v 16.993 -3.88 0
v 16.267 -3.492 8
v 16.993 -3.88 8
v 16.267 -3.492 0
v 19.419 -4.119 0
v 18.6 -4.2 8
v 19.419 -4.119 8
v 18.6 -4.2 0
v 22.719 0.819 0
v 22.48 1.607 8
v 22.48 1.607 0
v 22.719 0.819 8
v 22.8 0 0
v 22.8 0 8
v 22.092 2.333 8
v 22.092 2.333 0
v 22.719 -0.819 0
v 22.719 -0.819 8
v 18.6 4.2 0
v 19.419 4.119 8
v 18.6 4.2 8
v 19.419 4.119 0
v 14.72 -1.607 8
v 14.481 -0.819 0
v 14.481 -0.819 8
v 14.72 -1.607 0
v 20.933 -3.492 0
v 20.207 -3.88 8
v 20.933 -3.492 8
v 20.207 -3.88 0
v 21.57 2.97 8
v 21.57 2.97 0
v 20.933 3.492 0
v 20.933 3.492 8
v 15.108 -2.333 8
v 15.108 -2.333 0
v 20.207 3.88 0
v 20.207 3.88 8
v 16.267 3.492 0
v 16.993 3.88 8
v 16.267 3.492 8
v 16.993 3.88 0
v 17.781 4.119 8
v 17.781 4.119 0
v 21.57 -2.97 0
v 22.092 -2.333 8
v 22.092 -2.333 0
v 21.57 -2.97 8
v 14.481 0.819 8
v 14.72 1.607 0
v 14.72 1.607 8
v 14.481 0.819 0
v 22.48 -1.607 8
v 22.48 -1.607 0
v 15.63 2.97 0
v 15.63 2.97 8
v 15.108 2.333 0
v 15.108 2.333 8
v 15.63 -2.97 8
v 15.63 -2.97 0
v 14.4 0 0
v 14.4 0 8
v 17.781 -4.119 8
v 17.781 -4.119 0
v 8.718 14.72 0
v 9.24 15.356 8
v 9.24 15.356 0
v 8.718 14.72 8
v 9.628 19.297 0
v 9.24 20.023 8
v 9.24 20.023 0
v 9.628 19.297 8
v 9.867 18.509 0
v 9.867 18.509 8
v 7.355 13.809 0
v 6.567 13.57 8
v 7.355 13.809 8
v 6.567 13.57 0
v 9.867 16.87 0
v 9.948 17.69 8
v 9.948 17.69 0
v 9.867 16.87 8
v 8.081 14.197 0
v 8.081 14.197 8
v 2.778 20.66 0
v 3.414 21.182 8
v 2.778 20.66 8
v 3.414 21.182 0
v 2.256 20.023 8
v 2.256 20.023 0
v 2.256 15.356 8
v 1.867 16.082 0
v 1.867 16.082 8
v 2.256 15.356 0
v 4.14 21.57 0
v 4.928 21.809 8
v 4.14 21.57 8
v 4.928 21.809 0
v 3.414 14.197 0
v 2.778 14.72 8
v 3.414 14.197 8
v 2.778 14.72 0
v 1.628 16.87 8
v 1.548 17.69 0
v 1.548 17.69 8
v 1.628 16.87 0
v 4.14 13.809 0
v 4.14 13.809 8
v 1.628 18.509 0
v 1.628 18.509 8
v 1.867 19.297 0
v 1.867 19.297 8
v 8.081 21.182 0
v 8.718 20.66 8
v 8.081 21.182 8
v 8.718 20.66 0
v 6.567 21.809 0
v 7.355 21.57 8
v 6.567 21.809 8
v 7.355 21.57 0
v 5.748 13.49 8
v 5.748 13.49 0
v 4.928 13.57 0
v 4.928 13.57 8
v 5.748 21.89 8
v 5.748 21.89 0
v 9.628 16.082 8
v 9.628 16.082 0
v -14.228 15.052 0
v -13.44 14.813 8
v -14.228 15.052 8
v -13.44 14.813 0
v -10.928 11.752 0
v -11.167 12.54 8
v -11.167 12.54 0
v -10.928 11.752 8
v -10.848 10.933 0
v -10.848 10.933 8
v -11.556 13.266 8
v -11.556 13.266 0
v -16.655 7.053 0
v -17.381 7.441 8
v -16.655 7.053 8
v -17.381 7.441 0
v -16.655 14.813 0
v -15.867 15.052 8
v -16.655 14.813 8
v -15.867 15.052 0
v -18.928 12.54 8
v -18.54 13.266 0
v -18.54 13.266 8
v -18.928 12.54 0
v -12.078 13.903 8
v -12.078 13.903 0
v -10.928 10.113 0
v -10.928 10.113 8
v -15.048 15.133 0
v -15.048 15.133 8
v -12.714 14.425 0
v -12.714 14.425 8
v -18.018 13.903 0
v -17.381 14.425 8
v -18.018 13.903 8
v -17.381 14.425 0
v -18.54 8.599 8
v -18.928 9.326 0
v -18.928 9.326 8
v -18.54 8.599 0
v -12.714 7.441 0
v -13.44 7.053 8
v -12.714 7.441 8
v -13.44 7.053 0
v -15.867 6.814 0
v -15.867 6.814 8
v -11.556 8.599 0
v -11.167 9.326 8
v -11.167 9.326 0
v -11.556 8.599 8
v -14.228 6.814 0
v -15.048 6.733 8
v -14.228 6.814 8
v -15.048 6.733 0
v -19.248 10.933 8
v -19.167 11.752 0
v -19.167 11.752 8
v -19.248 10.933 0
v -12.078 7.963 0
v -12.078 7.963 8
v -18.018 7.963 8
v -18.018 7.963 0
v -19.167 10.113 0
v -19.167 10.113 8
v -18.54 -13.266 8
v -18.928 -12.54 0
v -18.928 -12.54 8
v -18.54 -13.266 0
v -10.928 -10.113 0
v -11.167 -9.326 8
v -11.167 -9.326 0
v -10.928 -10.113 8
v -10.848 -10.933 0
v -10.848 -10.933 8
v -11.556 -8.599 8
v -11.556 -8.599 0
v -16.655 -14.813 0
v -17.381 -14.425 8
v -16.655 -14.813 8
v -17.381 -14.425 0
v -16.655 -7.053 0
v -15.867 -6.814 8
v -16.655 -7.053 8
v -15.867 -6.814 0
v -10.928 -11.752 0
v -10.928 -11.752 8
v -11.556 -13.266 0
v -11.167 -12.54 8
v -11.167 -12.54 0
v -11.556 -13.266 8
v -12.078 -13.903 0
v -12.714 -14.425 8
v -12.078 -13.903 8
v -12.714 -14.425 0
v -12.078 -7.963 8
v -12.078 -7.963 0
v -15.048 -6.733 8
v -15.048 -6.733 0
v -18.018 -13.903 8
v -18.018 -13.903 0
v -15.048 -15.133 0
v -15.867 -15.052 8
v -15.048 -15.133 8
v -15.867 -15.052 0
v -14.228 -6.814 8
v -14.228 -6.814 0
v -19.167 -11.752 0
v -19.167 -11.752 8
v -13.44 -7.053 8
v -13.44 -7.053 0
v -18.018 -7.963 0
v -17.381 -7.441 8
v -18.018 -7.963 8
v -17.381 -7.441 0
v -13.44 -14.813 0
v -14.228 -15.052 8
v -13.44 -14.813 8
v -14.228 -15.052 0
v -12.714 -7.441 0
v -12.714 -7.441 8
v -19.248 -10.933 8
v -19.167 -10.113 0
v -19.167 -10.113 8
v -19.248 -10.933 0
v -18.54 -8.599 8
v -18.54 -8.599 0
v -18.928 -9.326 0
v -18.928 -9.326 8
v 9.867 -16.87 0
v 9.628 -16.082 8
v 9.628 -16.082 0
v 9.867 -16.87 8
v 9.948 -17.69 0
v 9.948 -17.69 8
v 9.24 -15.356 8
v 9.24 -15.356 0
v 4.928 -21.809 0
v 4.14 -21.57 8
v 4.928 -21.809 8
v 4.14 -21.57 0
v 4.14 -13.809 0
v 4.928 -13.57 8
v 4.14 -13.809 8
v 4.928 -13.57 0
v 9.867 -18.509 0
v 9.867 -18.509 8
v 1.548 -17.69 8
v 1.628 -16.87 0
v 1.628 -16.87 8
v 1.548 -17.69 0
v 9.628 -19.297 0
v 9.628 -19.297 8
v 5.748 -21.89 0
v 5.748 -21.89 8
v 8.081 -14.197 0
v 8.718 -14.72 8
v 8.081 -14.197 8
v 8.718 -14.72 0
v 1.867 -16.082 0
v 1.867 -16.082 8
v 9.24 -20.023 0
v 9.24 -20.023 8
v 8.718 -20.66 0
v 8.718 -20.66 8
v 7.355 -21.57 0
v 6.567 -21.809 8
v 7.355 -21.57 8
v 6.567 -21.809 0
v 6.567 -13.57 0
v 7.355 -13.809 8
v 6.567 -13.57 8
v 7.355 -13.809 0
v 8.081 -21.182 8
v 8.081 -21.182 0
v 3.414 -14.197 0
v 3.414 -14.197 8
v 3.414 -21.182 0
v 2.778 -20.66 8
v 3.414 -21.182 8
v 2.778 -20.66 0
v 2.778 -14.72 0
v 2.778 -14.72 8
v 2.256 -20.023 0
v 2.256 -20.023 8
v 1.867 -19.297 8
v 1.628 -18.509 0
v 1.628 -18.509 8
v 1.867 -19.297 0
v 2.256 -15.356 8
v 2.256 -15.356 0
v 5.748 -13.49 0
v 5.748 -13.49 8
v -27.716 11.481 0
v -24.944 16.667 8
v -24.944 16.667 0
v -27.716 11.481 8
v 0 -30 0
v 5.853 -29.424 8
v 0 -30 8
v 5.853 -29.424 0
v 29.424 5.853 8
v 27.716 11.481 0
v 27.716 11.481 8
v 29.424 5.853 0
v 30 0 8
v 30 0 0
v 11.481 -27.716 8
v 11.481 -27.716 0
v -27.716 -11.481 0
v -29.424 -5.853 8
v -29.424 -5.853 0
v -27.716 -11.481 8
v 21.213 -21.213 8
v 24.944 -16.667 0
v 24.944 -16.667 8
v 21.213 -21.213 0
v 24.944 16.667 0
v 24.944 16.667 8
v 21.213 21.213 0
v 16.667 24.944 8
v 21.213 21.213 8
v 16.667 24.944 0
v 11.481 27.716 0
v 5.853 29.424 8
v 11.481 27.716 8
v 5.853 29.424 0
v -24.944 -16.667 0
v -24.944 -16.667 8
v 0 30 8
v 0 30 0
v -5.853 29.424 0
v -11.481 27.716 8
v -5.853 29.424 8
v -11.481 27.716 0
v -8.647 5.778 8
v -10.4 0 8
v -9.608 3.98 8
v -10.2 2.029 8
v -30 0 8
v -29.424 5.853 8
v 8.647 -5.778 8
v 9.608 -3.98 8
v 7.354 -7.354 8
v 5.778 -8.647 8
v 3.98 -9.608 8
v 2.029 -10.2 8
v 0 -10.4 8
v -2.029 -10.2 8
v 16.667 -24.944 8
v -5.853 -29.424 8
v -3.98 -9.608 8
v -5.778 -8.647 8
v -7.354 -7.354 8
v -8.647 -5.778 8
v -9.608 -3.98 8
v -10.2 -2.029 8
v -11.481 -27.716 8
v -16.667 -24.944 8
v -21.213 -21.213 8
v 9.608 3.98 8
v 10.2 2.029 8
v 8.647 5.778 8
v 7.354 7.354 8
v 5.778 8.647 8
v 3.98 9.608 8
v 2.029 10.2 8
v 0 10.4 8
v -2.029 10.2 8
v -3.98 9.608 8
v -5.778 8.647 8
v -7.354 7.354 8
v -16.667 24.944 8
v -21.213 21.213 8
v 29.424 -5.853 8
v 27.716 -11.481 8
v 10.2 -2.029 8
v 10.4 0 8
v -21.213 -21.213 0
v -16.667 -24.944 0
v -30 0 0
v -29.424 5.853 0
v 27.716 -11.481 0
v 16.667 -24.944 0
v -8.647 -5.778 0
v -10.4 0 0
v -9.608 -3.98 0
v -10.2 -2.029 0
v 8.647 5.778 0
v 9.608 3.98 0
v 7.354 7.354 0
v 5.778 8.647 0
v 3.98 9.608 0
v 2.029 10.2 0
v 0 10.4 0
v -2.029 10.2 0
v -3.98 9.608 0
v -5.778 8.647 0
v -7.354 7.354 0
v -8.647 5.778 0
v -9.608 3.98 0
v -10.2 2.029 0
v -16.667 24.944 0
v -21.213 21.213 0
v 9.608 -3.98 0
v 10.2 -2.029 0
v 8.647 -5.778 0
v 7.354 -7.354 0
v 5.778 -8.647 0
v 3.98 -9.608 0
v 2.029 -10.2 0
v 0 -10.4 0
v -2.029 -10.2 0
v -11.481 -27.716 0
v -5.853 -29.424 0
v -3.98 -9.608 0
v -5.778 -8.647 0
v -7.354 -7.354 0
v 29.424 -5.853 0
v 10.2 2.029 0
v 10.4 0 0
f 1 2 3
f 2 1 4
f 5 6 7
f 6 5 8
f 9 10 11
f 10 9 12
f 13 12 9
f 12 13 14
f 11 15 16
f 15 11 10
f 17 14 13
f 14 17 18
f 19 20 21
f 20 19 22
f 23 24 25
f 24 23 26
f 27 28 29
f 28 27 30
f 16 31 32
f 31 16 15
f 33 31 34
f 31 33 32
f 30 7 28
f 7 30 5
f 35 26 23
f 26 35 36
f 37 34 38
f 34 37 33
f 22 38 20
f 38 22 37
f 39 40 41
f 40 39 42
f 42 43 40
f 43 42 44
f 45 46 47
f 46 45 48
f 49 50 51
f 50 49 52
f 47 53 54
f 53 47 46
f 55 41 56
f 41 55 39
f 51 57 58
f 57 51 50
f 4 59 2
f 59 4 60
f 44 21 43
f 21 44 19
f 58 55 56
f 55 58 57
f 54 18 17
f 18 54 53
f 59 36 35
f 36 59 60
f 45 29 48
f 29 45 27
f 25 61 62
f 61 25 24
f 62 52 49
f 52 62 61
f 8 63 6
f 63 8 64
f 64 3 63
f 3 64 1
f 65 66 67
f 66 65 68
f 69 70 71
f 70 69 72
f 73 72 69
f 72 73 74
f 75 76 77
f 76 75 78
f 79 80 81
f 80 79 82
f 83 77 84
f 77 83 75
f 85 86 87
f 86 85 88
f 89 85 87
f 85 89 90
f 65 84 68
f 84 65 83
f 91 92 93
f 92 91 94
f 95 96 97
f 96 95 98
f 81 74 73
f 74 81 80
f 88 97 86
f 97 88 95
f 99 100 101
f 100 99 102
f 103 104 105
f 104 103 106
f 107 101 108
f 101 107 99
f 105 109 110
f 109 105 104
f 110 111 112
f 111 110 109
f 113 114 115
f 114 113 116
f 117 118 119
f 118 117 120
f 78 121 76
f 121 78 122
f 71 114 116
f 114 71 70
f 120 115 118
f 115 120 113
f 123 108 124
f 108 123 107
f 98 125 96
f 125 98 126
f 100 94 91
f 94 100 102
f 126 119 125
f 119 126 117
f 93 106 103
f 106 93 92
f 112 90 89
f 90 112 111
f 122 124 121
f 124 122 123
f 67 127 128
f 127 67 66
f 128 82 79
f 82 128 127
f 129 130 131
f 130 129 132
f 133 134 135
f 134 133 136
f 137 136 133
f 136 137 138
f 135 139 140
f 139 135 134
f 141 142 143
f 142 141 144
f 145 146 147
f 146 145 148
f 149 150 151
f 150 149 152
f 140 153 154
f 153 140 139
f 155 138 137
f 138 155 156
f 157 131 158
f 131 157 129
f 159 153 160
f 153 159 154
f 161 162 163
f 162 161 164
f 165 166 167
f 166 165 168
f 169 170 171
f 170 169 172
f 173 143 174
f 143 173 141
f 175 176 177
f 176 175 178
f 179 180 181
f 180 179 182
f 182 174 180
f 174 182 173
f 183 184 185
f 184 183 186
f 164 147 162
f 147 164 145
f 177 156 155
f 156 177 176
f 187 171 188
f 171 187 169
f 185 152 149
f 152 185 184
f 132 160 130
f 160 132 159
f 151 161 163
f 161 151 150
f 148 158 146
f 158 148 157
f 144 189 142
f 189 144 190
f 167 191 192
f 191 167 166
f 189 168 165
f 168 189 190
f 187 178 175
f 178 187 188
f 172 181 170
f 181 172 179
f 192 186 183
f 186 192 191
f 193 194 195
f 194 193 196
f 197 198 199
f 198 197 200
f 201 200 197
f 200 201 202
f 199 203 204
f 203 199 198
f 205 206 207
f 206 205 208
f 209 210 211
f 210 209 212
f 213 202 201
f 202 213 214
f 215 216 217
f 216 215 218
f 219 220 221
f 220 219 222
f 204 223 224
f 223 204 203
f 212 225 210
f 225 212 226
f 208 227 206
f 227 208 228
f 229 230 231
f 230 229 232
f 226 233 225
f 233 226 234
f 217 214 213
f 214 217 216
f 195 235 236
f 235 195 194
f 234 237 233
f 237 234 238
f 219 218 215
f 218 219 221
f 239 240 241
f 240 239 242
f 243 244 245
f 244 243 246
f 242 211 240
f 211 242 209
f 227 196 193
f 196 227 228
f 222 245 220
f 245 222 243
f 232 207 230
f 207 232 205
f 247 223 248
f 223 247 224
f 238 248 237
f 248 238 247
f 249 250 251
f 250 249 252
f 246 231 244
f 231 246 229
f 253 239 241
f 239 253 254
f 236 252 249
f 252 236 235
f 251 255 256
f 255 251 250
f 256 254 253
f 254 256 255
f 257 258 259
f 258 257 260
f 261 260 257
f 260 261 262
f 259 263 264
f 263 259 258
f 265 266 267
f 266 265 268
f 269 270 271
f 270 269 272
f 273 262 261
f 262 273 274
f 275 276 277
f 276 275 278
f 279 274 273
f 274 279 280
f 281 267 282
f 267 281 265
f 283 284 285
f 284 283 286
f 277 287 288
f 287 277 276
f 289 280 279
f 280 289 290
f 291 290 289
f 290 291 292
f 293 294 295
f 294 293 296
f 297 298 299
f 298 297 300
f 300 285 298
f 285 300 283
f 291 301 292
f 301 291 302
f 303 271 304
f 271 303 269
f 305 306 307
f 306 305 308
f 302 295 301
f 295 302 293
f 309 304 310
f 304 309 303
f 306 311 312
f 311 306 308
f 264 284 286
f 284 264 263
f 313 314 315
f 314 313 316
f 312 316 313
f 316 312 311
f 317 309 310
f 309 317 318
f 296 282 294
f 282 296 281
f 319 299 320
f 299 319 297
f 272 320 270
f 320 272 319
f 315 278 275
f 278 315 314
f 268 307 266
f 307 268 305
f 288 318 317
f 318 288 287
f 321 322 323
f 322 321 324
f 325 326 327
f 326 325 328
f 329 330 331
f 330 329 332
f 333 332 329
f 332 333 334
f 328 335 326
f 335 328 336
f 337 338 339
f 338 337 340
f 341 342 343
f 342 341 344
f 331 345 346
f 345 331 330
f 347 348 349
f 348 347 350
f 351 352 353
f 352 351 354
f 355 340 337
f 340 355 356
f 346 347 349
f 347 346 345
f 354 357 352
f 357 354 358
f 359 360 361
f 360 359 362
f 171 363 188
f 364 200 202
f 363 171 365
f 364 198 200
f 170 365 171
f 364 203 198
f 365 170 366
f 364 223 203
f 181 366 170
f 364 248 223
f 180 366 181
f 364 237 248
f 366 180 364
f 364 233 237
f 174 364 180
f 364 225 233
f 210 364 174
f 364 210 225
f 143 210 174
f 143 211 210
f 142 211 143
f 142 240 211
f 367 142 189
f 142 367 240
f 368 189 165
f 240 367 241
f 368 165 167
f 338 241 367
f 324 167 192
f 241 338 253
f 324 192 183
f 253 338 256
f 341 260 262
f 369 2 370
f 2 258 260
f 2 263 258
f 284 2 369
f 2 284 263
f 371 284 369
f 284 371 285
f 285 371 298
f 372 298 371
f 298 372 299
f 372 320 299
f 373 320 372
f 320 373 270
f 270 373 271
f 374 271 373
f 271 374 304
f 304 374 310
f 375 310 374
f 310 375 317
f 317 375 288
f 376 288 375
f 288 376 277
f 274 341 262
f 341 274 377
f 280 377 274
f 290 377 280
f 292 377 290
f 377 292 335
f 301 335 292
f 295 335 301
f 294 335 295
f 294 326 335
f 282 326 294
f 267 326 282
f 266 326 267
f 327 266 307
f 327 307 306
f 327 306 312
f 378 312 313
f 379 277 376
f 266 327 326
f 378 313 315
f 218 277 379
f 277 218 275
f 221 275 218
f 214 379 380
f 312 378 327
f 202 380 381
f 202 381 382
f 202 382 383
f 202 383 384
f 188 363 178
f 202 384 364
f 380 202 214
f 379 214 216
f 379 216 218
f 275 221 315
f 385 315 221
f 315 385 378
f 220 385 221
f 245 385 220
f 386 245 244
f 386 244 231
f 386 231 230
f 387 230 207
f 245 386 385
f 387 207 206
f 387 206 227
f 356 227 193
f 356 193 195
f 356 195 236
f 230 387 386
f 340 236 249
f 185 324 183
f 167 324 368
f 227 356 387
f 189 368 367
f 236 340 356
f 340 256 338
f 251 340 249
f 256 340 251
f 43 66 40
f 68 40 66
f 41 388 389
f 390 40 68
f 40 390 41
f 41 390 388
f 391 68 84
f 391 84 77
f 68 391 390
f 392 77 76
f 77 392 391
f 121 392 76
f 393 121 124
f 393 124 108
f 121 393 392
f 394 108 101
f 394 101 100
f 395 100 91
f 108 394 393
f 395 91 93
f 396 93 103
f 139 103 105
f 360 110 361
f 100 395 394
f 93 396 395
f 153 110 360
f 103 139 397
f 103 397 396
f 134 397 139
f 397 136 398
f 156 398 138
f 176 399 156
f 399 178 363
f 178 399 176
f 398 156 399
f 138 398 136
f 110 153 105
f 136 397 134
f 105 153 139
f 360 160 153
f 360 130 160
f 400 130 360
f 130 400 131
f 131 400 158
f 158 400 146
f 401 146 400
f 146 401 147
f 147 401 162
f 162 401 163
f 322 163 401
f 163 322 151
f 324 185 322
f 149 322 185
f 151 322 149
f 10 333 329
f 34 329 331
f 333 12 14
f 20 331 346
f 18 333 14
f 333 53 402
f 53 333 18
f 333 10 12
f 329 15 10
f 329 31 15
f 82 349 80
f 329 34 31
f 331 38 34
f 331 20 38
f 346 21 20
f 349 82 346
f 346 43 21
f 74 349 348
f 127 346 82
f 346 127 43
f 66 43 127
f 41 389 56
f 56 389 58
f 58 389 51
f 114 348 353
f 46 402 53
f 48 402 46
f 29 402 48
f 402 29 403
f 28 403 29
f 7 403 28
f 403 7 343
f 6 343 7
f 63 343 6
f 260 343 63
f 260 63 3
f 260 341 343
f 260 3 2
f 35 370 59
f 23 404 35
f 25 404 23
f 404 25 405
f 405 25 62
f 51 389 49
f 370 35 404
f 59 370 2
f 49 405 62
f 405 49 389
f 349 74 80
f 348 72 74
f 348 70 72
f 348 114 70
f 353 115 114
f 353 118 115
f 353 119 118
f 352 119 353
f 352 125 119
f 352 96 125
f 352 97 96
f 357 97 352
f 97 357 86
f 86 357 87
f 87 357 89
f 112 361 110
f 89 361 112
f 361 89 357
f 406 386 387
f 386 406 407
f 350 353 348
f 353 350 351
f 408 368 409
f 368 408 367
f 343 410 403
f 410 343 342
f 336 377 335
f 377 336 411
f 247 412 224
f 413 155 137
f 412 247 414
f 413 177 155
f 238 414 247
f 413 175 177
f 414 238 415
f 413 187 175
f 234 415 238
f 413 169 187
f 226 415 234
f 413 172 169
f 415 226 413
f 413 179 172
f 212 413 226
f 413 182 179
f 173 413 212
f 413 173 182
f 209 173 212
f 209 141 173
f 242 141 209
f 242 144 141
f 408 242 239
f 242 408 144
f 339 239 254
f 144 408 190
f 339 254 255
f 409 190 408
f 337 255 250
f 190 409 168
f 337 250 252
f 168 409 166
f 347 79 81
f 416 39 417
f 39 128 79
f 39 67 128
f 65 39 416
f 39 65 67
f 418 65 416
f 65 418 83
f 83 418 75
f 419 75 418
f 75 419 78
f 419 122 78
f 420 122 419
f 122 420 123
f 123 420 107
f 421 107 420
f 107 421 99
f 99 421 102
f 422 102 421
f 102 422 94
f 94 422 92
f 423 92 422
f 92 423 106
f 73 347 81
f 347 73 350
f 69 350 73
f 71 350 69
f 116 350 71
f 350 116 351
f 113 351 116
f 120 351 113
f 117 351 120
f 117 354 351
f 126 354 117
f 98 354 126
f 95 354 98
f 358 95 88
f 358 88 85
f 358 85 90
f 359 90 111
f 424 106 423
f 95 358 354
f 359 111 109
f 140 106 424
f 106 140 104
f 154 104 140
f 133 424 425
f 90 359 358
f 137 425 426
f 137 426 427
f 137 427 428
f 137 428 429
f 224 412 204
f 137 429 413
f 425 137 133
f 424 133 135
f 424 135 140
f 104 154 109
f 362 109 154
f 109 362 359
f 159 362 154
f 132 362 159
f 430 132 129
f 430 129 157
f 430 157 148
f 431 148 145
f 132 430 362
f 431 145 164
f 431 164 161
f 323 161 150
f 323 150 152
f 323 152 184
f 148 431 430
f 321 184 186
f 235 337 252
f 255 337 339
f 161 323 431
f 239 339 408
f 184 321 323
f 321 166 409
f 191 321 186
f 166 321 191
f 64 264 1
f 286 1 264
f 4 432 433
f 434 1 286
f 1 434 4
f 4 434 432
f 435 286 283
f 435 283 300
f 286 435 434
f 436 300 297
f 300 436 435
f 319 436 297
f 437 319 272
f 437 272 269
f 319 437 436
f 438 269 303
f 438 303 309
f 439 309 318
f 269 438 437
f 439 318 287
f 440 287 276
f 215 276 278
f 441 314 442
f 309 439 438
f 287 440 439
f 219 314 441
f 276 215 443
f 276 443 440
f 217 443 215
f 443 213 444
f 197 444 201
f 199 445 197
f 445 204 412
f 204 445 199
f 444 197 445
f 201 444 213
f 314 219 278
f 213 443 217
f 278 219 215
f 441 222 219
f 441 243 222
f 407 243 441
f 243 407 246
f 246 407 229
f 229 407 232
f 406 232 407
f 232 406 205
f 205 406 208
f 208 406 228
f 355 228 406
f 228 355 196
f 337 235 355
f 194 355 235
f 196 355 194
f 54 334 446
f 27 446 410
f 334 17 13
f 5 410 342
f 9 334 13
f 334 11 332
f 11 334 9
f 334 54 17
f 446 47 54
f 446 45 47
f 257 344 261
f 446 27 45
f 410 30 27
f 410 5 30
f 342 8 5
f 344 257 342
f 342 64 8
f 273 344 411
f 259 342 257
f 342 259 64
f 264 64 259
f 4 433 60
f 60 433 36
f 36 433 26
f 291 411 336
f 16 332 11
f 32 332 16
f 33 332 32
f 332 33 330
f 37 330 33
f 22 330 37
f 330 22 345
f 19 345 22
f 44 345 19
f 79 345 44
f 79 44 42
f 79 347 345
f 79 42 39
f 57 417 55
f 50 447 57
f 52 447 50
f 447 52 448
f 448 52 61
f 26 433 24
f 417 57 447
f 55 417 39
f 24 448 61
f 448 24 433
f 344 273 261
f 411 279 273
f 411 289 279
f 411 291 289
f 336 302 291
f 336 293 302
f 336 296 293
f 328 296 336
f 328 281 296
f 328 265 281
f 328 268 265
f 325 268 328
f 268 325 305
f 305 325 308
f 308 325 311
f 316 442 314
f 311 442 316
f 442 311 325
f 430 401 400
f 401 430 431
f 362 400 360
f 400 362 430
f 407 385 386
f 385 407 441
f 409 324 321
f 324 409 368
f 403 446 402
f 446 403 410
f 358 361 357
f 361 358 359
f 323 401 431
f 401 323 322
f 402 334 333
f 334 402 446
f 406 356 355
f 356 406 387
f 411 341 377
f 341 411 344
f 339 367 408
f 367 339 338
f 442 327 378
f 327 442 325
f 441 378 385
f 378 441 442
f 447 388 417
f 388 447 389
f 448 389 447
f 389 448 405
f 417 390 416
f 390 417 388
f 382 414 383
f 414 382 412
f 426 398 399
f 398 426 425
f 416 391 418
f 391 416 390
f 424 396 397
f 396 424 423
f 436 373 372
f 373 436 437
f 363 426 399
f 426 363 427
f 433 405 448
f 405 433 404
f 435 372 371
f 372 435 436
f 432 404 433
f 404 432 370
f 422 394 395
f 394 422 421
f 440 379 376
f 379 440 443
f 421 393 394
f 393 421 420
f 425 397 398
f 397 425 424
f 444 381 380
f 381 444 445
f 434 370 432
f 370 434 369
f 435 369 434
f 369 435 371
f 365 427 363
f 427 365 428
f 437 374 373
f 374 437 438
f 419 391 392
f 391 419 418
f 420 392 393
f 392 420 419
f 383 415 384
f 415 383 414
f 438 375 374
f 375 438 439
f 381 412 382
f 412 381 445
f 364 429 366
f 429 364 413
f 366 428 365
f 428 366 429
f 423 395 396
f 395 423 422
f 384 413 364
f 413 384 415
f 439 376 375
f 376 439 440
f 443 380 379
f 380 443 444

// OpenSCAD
$fn = 32;

// ----------------------------------------------------------------------
// Flange Ø60 x 8
// 5 holes on a Ø37.2 bolt circle, bolted joints
// ----------------------------------------------------------------------

// --- parameters (mm) ---
flange_d = 60;  // outside diameter of the flange
thickness = 8;  // flange thickness
holes = 5;      // number of bolt holes
pcd = 37.2;     // bolt circle diameter
start_deg = 0;  // angle of the first hole, from +X
hole_d = 8.4;   // bolt hole diameter
bore_d = 20.8;  // central through bore
hub_d = 28.8;   // hub outside diameter
hub_h = 0;      // hub height above the flange face (0 = no hub)

// --- derived feature positions (mm) ---
height = thickness + hub_h;  // = 8   overall height of the part
pcd_r = pcd / 2;             // = 18.6   bolt circle radius
hole_step = 360 / holes;     // = 72   angular pitch
feature_centers = [
  [pcd_r * cos(start_deg + 0 * hole_step), pcd_r * sin(start_deg + 0 * hole_step)],
  [pcd_r * cos(start_deg + 1 * hole_step), pcd_r * sin(start_deg + 1 * hole_step)],
  [pcd_r * cos(start_deg + 2 * hole_step), pcd_r * sin(start_deg + 2 * hole_step)],
  [pcd_r * cos(start_deg + 3 * hole_step), pcd_r * sin(start_deg + 3 * hole_step)],
  [pcd_r * cos(start_deg + 4 * hole_step), pcd_r * sin(start_deg + 4 * hole_step)]
];   // bolt hole centres on the pitch circle

// flange disc, every hole and the bore cut straight through
difference() {
  union() {
    cylinder(d = flange_d, h = thickness);
  }
  translate([0, 0, -1]) cylinder(d = bore_d, h = height + 2);  // bore, through
  for (centre = feature_centers)
    translate([centre[0], centre[1], -1]) cylinder(d = hole_d, h = thickness + 2);
}
